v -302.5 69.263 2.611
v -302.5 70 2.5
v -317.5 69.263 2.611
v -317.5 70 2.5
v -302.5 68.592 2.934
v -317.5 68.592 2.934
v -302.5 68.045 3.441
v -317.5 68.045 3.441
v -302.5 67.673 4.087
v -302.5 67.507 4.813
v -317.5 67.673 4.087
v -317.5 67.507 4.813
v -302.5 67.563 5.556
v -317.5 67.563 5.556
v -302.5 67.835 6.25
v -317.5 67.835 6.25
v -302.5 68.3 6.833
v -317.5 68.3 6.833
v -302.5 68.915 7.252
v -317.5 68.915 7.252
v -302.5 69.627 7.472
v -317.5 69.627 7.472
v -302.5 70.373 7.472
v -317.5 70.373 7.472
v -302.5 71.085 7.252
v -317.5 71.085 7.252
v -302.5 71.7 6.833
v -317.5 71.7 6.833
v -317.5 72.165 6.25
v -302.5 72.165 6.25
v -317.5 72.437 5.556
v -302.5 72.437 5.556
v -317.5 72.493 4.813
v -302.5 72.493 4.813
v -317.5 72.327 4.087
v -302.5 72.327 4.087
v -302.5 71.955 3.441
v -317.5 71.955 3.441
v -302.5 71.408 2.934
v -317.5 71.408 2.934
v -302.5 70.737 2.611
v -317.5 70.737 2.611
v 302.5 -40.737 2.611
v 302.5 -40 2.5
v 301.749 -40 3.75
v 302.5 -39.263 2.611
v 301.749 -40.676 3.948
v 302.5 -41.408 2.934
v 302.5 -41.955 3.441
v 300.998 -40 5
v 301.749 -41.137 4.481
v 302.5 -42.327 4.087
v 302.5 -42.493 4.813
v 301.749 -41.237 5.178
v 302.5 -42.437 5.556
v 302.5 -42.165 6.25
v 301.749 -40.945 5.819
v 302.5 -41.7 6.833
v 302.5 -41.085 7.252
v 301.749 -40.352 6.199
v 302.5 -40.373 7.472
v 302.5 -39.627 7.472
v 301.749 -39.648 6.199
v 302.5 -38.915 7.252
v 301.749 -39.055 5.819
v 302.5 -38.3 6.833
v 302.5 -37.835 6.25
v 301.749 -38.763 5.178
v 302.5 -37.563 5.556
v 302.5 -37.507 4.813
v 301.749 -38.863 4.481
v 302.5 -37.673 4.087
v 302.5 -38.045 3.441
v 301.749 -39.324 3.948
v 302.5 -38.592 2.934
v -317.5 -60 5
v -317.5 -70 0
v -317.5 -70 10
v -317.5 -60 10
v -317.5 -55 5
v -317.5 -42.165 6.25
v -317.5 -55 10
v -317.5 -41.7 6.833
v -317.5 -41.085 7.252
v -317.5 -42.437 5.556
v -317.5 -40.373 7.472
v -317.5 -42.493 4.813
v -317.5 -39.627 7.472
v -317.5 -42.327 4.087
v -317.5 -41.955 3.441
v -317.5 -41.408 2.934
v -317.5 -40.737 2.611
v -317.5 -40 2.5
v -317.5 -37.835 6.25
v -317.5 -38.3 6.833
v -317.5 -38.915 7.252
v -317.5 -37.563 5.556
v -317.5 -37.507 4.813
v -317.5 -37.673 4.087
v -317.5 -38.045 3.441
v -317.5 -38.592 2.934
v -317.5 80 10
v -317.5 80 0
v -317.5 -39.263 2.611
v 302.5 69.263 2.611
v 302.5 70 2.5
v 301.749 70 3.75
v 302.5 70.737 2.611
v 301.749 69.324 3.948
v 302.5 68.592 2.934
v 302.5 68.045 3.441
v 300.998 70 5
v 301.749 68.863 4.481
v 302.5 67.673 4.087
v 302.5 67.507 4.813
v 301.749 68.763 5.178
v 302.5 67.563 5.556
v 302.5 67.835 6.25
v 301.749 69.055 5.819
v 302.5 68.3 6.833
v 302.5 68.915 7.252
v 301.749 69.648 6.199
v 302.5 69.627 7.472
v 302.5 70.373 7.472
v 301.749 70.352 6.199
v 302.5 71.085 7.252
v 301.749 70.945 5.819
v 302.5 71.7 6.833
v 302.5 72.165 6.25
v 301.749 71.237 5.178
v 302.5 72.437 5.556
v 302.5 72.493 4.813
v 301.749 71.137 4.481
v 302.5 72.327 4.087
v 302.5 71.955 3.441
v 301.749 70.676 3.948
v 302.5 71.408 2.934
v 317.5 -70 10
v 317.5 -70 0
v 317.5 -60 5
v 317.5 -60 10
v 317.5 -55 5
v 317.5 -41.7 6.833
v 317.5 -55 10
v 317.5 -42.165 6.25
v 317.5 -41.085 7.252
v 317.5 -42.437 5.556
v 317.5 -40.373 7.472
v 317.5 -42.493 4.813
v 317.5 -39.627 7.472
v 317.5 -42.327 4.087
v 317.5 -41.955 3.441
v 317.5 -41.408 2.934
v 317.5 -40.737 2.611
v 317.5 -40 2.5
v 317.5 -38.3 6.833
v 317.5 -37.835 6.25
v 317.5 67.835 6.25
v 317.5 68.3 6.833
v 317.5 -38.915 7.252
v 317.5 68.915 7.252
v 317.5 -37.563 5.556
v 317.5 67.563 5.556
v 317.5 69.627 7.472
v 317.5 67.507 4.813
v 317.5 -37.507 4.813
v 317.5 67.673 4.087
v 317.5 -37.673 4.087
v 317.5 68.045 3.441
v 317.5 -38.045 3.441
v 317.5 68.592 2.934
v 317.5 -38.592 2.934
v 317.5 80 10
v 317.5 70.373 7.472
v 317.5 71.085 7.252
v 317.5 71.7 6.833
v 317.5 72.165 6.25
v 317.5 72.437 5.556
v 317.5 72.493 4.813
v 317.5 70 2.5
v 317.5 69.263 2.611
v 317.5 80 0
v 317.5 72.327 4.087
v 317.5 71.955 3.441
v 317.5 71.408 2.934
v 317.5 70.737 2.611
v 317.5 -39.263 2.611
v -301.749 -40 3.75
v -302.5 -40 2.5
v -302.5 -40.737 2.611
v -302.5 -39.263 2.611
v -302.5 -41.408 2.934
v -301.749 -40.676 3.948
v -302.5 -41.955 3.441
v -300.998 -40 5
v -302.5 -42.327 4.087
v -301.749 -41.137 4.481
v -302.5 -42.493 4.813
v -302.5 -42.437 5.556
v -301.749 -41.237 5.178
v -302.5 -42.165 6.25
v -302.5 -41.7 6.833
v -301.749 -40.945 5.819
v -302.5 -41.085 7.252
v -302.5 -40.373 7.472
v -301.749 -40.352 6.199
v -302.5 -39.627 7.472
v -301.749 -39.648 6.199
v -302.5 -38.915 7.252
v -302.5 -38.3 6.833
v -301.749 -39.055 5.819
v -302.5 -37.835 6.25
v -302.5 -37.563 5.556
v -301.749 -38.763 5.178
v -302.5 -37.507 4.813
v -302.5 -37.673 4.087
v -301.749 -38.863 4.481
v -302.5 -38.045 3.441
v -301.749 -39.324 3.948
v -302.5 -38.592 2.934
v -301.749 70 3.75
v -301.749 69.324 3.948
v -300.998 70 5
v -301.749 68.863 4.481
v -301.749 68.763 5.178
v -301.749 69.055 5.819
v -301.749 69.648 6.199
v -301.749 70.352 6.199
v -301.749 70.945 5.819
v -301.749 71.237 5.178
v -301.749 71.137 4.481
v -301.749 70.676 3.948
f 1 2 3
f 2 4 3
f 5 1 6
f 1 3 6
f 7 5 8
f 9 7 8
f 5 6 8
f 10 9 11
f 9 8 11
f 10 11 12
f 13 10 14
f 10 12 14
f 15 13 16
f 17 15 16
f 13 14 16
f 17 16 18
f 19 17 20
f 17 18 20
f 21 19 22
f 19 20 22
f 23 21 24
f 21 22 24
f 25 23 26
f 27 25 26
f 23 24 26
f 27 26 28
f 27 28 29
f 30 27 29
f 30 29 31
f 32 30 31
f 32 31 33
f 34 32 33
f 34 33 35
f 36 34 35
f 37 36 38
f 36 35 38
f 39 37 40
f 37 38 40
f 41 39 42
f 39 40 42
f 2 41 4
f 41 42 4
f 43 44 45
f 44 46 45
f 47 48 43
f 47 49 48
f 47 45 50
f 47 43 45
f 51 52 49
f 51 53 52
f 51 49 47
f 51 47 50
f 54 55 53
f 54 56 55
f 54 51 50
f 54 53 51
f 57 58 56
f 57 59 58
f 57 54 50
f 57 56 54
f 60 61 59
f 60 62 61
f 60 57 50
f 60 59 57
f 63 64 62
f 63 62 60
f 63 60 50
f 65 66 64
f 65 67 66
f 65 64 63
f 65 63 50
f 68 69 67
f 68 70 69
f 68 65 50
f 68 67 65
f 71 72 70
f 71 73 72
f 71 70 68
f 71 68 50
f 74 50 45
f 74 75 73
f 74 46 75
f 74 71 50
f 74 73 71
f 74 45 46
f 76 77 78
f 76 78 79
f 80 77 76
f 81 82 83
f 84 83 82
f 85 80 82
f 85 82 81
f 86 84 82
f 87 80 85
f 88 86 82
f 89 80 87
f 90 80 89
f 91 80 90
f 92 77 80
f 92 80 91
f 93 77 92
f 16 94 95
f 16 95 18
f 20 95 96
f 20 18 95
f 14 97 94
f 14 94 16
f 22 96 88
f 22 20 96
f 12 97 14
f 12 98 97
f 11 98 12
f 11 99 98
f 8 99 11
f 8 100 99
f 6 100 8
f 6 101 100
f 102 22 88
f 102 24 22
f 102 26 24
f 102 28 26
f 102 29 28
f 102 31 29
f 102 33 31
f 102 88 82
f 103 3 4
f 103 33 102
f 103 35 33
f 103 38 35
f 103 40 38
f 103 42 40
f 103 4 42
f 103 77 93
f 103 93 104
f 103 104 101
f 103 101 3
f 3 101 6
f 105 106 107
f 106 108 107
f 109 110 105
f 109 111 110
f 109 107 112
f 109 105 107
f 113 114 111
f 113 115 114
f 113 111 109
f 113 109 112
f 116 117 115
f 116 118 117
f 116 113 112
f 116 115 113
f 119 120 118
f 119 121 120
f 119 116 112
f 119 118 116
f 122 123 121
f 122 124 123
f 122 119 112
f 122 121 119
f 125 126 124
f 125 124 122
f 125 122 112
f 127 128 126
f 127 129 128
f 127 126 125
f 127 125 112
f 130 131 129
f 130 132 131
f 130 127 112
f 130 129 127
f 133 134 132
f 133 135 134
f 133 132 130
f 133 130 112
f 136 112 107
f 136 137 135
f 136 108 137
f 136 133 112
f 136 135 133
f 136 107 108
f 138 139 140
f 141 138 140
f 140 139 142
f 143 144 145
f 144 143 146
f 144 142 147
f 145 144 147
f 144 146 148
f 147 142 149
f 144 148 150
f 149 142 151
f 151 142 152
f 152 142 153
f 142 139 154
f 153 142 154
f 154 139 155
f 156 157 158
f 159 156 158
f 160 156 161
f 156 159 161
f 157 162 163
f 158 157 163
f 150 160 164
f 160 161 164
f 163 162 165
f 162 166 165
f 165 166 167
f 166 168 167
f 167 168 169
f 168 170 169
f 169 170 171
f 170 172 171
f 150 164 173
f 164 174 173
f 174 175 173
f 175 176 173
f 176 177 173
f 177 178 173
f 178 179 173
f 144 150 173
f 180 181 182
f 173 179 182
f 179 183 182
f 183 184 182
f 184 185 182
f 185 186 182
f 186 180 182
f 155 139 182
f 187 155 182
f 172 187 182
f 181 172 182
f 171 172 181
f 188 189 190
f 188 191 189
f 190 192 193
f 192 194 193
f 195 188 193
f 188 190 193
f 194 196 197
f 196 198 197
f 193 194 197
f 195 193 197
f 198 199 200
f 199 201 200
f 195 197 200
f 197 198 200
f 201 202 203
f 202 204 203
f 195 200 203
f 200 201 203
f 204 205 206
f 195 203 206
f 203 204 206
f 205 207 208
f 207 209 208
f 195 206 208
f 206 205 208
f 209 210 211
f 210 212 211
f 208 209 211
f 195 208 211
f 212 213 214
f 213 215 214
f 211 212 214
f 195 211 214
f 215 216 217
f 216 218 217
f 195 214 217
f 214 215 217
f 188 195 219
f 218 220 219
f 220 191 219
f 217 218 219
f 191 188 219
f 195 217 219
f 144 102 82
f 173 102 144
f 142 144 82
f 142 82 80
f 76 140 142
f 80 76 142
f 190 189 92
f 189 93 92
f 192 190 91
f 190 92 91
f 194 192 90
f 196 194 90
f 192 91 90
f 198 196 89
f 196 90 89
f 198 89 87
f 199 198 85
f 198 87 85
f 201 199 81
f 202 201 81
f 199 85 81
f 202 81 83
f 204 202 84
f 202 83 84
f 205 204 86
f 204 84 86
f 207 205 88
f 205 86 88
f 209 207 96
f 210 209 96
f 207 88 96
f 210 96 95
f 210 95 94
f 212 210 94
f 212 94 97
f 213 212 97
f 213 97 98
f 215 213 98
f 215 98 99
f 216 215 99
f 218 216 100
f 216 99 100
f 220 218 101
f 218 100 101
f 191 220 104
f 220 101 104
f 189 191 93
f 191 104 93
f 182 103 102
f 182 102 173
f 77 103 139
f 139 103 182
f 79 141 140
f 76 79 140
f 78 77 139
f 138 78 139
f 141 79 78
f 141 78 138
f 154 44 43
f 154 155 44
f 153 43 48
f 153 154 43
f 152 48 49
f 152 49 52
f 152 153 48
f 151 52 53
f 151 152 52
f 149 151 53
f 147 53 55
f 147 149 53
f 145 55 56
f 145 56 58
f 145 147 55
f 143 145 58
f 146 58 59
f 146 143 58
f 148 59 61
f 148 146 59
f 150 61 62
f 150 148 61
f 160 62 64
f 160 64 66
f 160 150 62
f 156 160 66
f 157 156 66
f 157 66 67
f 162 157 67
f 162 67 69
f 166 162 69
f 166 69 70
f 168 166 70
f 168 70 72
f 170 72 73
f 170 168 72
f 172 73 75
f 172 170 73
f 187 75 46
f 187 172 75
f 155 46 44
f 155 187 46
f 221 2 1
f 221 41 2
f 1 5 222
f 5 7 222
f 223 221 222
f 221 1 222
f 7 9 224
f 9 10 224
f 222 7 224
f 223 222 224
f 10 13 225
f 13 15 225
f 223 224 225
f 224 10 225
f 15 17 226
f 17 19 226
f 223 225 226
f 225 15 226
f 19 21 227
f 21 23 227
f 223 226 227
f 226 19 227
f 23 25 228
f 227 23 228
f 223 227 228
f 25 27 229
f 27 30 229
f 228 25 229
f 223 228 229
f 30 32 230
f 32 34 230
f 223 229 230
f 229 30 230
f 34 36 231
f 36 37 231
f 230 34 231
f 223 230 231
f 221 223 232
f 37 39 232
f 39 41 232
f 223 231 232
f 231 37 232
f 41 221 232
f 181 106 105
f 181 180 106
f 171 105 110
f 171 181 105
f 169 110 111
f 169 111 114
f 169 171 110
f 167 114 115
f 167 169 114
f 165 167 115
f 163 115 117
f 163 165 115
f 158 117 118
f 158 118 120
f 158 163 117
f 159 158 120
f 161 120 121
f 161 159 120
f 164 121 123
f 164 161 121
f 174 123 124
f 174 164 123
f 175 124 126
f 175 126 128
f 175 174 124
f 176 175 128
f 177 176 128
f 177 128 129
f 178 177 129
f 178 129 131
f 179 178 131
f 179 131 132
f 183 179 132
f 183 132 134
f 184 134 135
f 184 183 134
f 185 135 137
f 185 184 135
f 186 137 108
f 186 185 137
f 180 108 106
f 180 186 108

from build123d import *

# Parameters (mm, degrees)
SKETCH1_W                               = 635
SKETCH1_H                               = 150
BASE_EXTRUDE_DEPTH                      = 10
SKETCH2_W                               = 5
SKETCH2_H                               = 5
CUT_EXTRUDE1_DEPTH                      = 641.097648801
M5_0_5_000000_DIAMETER_HOLE1_AT_2_COUNT = 2
M5_0_5_000000_DIAMETER_HOLE1_AT_2_PITCH = 110


with BuildPart() as part:
    # Sketch1 → Base-Extrude (new body)
    with BuildSketch(Plane.XY):
        with Locations((0, 5)):
            Rectangle(SKETCH1_W, SKETCH1_H)
    extrude(amount=BASE_EXTRUDE_DEPTH)

    # Sketch2 → Cut-Extrude1 (cut, through all)
    with BuildSketch(Plane(origin=(317.5, 0, 0), x_dir=(0, 0, -1), z_dir=(1, 0, 0))):
        with Locations((-7.5, -57.5)):
            Rectangle(SKETCH2_W, SKETCH2_H)
    extrude(amount=-CUT_EXTRUDE1_DEPTH, mode=Mode.SUBTRACT)

    # Sketch4 → M5.0 (5.000000) Diameter Hole1 (revolve, cut)
    with BuildSketch(Plane(origin=(317.5, 70, 5), x_dir=(0, 0, -1), z_dir=(0, 1, 0))):
        Polygon((0, 0), (0, 16.502151548), (2.5, 15), (2.5, 0), align=None)
    m5_0_5_000000_diameter_hole1 = revolve(axis=Axis((323.85, 70, 5), (-1, 0, 0)), mode=Mode.SUBTRACT)

    # M5.0 (5.000000) Diameter Hole1 at 2: M5.0 (5.000000) Diameter Hole1 ×2
    with Locations(*[(0, -i * M5_0_5_000000_DIAMETER_HOLE1_AT_2_PITCH, 0) for i in range(1, M5_0_5_000000_DIAMETER_HOLE1_AT_2_COUNT)]):
        add(m5_0_5_000000_diameter_hole1, mode=Mode.SUBTRACT)

    # Mirror1: M5.0 (5.000000) Diameter Hole1 across plane
    add(m5_0_5_000000_diameter_hole1.mirror(Plane(origin=(0, 0, 0), x_dir=(0, 0, 1), z_dir=(1, 0, 0))), mode=Mode.SUBTRACT)

    # Mirror1 copy 1 sketch → Mirror1 copy 1 (revolve, cut)
    with BuildSketch(Plane(origin=(-317.5, -40, 5), x_dir=(0, 0, -1), z_dir=(0, 1, 0))):
        Polygon((0, 0), (0, -16.502151548), (2.5, -15), (2.5, 0), align=None)
    revolve(axis=Axis((-323.85, -40, 5), (-1, 0, 0)), mode=Mode.SUBTRACT)


solid = part.part
